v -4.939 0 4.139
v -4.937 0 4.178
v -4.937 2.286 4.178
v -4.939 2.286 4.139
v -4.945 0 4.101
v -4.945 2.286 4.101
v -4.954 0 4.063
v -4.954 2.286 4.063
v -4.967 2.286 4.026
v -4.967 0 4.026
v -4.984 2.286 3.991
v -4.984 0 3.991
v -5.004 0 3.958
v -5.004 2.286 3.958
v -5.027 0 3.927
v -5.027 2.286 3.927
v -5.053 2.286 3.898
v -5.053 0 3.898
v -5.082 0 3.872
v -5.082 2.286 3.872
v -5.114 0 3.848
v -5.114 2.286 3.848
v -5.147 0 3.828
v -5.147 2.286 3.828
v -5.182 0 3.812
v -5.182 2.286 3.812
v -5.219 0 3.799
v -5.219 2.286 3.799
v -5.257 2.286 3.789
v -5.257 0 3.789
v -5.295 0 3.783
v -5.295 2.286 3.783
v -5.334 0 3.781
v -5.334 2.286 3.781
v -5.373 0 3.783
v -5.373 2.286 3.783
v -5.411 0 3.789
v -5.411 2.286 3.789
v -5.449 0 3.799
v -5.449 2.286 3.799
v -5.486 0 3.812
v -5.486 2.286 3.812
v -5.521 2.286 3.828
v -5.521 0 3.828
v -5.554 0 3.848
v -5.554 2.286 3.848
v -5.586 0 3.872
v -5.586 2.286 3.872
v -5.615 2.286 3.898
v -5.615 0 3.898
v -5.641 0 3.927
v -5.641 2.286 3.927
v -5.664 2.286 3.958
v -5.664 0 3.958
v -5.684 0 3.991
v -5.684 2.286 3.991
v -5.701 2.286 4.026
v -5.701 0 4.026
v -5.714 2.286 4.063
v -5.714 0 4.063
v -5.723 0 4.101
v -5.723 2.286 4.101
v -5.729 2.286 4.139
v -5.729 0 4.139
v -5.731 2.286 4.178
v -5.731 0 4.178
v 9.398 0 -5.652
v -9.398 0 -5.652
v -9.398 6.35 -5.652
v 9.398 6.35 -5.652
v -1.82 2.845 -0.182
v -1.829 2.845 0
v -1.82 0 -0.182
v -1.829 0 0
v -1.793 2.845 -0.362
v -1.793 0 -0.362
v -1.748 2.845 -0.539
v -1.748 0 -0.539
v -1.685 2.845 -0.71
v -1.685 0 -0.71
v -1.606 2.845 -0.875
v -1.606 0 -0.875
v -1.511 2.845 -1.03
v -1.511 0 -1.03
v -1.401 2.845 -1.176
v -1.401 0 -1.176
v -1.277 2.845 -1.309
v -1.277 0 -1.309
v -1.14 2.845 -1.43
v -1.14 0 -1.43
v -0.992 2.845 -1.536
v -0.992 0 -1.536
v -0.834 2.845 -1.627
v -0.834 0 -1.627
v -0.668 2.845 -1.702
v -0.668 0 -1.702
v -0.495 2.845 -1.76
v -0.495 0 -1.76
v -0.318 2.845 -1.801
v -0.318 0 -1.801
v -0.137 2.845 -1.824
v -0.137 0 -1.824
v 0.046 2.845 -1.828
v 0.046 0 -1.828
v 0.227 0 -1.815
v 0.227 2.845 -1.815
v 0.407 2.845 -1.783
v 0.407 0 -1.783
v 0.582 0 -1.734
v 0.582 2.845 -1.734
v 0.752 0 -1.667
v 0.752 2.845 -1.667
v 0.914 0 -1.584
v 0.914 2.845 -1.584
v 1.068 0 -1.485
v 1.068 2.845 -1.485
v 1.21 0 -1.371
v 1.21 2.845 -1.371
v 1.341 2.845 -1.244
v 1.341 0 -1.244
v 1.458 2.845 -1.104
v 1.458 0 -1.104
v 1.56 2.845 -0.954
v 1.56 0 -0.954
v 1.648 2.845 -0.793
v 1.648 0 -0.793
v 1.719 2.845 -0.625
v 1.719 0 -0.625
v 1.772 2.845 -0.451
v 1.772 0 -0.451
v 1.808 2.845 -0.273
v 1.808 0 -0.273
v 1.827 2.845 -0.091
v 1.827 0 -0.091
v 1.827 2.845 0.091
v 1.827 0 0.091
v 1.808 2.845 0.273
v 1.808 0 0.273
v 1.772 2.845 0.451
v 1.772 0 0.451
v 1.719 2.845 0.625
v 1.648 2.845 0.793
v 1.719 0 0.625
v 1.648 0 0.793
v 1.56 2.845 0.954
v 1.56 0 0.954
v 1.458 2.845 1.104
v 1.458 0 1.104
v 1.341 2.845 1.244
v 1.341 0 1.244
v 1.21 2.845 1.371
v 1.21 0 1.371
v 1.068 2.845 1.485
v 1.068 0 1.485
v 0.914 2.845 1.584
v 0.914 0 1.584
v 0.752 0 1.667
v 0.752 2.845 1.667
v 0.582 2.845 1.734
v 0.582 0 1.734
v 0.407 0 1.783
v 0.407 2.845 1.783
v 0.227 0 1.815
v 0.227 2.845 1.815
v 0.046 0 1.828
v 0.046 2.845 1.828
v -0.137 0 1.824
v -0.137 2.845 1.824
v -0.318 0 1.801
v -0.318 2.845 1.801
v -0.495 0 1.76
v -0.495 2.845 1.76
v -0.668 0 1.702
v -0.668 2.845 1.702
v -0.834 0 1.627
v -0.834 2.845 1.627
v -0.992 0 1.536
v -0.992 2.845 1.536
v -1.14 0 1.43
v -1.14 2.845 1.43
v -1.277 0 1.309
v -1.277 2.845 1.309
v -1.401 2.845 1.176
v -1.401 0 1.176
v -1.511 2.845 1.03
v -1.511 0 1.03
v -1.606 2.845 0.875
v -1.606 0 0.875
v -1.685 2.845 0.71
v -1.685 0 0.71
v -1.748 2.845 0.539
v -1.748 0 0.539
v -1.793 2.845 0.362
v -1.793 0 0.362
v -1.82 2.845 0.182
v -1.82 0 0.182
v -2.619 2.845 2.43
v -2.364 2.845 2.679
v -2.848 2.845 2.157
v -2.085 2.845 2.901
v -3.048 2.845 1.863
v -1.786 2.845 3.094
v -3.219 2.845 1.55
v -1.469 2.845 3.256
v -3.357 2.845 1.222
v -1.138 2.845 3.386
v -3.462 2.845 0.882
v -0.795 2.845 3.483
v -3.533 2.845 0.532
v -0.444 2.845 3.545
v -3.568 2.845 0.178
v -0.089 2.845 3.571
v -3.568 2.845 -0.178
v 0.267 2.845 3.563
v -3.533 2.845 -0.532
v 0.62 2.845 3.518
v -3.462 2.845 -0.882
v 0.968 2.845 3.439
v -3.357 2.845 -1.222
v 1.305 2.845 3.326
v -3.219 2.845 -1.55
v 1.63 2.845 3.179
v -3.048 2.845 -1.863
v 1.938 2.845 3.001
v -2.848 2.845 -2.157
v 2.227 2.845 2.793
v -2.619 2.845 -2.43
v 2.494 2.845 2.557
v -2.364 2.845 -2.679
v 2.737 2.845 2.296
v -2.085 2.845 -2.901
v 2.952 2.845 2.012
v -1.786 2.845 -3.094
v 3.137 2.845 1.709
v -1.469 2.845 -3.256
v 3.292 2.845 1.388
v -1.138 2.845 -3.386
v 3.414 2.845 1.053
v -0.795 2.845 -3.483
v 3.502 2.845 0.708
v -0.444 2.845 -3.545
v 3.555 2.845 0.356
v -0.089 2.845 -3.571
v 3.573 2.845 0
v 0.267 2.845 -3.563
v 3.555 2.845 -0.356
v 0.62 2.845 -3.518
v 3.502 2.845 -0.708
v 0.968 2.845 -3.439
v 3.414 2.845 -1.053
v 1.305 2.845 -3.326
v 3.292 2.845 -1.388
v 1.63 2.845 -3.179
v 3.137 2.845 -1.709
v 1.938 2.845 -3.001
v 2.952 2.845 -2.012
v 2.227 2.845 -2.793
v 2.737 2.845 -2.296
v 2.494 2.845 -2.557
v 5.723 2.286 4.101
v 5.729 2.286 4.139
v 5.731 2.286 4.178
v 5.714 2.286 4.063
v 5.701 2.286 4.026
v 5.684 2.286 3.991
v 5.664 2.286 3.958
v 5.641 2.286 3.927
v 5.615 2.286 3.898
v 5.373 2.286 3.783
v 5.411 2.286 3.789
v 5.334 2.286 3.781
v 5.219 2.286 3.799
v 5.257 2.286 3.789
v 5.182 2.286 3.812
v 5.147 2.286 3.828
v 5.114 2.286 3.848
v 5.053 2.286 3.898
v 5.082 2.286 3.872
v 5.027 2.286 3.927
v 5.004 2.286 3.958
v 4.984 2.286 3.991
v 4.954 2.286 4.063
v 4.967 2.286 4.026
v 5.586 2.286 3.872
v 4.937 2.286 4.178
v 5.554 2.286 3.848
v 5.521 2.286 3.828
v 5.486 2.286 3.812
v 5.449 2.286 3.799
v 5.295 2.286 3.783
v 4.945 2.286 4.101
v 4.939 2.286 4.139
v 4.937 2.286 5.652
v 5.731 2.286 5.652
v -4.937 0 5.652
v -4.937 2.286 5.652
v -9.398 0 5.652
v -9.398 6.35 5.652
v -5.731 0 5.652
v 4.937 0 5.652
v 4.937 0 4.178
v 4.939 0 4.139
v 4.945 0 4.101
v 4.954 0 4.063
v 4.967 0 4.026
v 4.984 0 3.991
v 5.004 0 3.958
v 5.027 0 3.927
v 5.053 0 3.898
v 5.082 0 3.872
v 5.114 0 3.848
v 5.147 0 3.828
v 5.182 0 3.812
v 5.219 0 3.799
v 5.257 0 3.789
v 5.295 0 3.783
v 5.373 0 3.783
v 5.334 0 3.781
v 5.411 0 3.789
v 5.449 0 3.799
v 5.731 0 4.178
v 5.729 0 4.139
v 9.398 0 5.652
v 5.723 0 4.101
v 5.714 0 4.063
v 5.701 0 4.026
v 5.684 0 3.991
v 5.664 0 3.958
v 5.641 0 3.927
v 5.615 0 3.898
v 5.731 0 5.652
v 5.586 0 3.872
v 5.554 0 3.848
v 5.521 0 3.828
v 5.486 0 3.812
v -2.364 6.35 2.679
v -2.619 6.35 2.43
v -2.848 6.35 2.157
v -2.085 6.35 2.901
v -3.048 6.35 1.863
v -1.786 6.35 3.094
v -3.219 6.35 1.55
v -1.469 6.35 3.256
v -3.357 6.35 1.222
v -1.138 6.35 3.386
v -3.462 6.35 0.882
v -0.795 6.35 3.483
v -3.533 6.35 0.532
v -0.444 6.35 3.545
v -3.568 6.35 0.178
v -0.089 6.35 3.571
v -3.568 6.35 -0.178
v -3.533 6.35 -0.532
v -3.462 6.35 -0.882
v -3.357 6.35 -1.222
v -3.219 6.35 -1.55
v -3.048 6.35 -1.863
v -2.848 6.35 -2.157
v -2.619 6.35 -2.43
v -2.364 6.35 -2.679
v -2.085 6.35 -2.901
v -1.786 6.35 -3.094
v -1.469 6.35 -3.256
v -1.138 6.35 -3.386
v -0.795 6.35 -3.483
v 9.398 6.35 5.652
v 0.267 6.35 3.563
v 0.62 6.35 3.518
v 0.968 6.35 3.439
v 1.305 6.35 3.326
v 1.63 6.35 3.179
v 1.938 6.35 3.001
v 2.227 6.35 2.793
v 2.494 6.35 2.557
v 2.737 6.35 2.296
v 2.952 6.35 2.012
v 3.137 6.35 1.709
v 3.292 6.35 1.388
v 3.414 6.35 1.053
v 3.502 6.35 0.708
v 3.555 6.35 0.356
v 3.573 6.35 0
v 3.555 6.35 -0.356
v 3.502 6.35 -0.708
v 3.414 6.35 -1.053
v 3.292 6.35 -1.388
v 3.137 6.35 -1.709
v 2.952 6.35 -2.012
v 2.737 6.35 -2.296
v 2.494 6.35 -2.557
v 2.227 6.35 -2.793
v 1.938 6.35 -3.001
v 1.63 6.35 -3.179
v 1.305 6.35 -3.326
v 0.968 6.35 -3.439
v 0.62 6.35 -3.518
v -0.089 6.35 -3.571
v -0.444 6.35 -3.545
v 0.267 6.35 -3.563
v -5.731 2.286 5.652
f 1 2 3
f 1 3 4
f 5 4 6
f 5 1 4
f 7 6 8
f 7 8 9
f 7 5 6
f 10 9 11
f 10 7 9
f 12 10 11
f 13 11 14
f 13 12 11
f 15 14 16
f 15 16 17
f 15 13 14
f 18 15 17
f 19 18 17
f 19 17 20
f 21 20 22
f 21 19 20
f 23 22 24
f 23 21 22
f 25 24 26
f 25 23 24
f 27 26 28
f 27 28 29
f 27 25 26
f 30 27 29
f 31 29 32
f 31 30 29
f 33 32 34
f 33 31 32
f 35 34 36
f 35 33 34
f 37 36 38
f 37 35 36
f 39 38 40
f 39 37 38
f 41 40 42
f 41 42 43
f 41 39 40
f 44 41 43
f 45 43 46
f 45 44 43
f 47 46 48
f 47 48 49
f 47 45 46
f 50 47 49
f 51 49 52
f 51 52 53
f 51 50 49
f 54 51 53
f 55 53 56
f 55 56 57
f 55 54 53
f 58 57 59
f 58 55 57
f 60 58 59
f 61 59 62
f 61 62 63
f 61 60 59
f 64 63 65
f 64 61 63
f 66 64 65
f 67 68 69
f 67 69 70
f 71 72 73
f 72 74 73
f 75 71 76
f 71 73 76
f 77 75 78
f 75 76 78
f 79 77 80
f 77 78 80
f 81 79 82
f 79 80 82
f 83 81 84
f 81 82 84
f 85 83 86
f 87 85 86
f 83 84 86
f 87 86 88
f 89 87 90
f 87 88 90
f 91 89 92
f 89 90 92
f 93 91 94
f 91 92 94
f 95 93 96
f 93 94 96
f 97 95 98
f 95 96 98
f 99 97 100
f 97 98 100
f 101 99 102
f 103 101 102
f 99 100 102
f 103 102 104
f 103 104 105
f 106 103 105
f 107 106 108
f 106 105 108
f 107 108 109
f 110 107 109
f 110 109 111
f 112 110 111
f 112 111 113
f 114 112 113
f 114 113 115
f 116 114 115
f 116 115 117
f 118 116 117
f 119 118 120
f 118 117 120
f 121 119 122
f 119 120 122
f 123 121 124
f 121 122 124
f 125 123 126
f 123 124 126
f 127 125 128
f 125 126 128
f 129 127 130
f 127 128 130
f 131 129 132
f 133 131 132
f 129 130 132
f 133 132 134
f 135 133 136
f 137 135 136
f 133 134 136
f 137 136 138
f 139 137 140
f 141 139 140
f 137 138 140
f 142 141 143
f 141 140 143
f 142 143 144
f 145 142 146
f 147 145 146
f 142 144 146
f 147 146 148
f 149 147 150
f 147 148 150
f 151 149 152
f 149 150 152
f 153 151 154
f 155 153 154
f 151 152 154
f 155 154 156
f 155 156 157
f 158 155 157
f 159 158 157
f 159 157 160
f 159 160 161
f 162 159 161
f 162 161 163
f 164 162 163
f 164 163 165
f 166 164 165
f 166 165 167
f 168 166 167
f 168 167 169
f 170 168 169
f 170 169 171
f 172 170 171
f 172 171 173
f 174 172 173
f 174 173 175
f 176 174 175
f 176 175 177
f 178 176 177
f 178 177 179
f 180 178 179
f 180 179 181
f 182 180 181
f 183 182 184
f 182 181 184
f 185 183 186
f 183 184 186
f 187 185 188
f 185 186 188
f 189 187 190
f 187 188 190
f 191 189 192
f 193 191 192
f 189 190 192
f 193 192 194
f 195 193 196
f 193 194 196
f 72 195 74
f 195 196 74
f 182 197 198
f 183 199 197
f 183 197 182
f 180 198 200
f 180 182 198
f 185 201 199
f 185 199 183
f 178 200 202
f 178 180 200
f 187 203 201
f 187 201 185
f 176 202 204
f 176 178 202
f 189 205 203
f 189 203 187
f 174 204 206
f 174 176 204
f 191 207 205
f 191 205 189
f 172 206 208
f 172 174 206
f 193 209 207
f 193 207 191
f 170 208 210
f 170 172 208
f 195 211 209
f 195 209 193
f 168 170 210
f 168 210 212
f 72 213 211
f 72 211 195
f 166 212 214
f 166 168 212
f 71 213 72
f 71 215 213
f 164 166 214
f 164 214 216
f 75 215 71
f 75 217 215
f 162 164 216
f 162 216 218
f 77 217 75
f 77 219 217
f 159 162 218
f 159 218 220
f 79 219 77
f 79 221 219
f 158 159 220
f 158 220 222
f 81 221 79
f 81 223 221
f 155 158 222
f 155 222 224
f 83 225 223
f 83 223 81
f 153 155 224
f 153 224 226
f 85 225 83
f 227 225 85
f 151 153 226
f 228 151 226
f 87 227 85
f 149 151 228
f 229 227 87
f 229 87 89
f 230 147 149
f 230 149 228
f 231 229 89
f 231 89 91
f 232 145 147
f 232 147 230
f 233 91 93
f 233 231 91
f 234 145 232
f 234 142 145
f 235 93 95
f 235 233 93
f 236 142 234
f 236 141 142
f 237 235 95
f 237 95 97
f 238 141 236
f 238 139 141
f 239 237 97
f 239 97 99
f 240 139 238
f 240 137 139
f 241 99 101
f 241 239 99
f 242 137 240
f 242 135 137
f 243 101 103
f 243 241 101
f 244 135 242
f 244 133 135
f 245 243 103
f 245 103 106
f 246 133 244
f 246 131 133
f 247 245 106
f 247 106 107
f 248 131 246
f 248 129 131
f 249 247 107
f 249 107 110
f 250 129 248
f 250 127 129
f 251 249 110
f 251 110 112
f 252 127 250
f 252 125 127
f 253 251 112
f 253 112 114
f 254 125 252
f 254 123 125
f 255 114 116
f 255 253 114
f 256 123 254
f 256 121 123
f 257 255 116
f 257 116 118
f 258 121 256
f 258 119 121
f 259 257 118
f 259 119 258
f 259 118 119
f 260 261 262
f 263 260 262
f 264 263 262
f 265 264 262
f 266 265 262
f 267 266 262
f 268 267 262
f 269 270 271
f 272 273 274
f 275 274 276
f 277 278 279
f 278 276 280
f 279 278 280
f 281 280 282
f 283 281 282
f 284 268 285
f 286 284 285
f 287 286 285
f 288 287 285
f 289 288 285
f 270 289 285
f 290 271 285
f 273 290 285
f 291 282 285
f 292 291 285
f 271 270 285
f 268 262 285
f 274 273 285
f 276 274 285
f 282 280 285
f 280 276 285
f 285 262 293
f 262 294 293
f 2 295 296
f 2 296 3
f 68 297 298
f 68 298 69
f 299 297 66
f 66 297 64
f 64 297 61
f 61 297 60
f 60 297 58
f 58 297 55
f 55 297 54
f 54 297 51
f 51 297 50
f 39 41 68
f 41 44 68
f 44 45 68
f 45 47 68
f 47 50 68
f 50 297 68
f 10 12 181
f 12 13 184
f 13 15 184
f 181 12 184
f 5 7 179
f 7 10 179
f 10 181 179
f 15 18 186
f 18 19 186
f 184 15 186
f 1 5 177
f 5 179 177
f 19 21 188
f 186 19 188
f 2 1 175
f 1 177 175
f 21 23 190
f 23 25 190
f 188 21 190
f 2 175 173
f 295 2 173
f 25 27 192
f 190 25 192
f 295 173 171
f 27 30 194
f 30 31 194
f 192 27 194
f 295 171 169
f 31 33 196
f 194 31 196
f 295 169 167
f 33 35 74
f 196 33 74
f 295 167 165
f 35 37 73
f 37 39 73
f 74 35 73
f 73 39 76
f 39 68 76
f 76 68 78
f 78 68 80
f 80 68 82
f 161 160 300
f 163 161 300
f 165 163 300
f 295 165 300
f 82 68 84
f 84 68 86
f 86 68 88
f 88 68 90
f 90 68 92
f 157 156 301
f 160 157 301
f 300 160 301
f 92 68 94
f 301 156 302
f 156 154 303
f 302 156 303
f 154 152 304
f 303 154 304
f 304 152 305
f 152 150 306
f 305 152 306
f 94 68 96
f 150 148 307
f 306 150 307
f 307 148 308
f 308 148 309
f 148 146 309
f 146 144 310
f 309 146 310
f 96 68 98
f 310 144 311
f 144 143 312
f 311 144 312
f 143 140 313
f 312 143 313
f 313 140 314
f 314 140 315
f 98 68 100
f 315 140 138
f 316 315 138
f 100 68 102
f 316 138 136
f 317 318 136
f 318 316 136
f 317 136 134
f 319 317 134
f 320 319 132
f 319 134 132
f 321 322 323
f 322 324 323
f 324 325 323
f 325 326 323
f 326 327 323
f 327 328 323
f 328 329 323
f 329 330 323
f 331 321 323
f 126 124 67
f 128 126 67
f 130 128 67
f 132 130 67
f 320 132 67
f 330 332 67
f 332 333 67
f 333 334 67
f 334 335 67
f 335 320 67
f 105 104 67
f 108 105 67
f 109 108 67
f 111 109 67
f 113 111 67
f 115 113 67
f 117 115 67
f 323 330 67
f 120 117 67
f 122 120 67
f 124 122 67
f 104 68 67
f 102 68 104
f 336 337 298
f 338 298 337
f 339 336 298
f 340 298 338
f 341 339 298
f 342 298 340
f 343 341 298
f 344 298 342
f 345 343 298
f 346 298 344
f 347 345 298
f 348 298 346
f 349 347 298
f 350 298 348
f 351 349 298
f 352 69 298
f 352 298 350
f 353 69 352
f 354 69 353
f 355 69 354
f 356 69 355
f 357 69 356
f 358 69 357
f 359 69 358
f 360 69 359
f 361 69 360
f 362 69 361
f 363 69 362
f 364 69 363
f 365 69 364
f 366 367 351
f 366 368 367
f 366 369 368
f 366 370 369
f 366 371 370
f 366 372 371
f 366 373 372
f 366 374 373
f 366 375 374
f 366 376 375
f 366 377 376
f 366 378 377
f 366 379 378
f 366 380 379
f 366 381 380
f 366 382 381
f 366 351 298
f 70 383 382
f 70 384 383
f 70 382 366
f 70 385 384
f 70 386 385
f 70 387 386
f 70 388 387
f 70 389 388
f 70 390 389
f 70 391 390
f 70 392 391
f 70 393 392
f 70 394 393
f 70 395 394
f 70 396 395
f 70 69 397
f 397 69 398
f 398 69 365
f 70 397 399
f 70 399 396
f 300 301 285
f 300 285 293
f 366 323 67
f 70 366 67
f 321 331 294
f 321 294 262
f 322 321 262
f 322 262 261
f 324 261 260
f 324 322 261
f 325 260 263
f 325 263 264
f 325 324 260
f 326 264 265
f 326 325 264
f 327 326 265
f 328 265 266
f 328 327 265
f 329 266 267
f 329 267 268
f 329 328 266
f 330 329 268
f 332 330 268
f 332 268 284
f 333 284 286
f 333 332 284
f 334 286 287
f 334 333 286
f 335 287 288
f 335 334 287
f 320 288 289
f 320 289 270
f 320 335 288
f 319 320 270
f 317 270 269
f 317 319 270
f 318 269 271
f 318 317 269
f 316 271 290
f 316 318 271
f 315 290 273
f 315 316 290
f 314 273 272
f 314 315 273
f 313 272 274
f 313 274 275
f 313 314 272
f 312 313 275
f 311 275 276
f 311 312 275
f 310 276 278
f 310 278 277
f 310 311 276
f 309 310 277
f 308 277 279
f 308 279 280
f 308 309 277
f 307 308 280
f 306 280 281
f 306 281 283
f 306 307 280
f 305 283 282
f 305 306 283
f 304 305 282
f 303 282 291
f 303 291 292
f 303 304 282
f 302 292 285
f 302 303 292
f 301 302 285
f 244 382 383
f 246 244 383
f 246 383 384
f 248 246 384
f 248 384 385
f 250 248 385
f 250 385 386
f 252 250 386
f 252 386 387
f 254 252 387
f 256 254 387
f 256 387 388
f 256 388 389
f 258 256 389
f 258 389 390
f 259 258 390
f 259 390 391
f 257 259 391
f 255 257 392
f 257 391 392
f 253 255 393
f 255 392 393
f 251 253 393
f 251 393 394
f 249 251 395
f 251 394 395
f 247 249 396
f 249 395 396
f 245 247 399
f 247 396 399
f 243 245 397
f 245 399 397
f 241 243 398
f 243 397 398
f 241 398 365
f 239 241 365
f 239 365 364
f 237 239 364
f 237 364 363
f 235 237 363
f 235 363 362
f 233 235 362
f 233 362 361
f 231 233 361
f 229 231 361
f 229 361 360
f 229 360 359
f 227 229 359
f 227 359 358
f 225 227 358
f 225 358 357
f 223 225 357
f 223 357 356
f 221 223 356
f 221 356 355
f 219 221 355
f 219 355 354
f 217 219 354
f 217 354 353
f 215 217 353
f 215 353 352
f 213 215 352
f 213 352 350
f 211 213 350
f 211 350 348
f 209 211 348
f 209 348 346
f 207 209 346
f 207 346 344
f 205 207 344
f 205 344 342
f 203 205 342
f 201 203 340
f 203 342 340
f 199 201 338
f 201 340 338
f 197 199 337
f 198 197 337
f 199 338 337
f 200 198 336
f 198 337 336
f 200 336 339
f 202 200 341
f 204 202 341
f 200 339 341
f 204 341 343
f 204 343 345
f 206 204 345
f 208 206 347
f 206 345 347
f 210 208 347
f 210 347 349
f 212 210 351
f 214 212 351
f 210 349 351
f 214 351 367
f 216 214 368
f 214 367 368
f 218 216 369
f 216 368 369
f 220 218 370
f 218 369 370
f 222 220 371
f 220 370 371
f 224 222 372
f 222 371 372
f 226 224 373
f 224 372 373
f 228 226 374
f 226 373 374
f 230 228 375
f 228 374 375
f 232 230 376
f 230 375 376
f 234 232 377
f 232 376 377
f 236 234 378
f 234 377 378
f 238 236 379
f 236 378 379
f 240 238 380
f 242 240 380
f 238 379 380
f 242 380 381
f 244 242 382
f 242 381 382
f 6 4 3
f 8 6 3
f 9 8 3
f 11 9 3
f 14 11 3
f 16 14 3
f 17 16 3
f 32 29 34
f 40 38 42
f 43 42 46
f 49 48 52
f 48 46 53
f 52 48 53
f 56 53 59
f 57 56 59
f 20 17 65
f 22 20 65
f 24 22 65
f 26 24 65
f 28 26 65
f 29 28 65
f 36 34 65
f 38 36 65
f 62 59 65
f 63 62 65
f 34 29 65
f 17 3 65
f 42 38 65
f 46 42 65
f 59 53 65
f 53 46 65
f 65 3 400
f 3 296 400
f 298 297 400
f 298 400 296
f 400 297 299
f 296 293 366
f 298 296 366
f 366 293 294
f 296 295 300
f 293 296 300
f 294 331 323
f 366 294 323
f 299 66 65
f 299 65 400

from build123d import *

# Parameters (mm, degrees)
SKETCH1_W               = 18.796
SKETCH1_H               = 11.303
BASE_DEPTH              = 6.35
BOXSLOTS_DEPTH          = 2.286
MOUTINGHOLE_D           = 3.6576
MOUTINGHOLE_CBORE_D     = 7.14502
MOUTINGHOLE_CBORE_DEPTH = 3.5052


with BuildPart() as part:
    # Sketch1 → Base (new body)
    with BuildSketch(Plane(origin=(0, 0, 0), x_dir=(1, 0, 0), z_dir=(0, 1, 0))):
        Rectangle(SKETCH1_W, SKETCH1_H)
    extrude(amount=BASE_DEPTH)

    # Sketch2 → BoxSlots (cut)
    with BuildSketch(Plane.XZ):
        with BuildLine():
            Line((-4.937125, 5.6515), (-4.937125, 4.1783))
            ThreePointArc((-4.937125, 4.1783), (-5.334, 3.781425), (-5.730875, 4.1783))
            Line((-5.730875, 4.1783), (-5.730875, 5.6515))
            ThreePointArc((-5.730875, 5.6515), (-5.334, 6.048375), (-4.937125, 5.6515))
        make_face()
        with BuildLine():
            Line((5.730875, 5.6515), (5.730875, 4.1783))
            ThreePointArc((5.730875, 4.1783), (5.334, 3.781425), (4.937125, 4.1783))
            Line((4.937125, 4.1783), (4.937125, 5.6515))
            ThreePointArc((4.937125, 5.6515), (5.334, 6.048375), (5.730875, 5.6515))
        make_face()
    extrude(amount=-BOXSLOTS_DEPTH, mode=Mode.SUBTRACT)

    # MoutingHole (through all)
    with Locations(Plane(origin=(0, 6.35, 0), x_dir=(1, 0, 0), z_dir=(0, 1, 0))):
        with Locations((0, 0)):
            CounterBoreHole(MOUTINGHOLE_D / 2, MOUTINGHOLE_CBORE_D / 2, MOUTINGHOLE_CBORE_DEPTH)


solid = part.part
